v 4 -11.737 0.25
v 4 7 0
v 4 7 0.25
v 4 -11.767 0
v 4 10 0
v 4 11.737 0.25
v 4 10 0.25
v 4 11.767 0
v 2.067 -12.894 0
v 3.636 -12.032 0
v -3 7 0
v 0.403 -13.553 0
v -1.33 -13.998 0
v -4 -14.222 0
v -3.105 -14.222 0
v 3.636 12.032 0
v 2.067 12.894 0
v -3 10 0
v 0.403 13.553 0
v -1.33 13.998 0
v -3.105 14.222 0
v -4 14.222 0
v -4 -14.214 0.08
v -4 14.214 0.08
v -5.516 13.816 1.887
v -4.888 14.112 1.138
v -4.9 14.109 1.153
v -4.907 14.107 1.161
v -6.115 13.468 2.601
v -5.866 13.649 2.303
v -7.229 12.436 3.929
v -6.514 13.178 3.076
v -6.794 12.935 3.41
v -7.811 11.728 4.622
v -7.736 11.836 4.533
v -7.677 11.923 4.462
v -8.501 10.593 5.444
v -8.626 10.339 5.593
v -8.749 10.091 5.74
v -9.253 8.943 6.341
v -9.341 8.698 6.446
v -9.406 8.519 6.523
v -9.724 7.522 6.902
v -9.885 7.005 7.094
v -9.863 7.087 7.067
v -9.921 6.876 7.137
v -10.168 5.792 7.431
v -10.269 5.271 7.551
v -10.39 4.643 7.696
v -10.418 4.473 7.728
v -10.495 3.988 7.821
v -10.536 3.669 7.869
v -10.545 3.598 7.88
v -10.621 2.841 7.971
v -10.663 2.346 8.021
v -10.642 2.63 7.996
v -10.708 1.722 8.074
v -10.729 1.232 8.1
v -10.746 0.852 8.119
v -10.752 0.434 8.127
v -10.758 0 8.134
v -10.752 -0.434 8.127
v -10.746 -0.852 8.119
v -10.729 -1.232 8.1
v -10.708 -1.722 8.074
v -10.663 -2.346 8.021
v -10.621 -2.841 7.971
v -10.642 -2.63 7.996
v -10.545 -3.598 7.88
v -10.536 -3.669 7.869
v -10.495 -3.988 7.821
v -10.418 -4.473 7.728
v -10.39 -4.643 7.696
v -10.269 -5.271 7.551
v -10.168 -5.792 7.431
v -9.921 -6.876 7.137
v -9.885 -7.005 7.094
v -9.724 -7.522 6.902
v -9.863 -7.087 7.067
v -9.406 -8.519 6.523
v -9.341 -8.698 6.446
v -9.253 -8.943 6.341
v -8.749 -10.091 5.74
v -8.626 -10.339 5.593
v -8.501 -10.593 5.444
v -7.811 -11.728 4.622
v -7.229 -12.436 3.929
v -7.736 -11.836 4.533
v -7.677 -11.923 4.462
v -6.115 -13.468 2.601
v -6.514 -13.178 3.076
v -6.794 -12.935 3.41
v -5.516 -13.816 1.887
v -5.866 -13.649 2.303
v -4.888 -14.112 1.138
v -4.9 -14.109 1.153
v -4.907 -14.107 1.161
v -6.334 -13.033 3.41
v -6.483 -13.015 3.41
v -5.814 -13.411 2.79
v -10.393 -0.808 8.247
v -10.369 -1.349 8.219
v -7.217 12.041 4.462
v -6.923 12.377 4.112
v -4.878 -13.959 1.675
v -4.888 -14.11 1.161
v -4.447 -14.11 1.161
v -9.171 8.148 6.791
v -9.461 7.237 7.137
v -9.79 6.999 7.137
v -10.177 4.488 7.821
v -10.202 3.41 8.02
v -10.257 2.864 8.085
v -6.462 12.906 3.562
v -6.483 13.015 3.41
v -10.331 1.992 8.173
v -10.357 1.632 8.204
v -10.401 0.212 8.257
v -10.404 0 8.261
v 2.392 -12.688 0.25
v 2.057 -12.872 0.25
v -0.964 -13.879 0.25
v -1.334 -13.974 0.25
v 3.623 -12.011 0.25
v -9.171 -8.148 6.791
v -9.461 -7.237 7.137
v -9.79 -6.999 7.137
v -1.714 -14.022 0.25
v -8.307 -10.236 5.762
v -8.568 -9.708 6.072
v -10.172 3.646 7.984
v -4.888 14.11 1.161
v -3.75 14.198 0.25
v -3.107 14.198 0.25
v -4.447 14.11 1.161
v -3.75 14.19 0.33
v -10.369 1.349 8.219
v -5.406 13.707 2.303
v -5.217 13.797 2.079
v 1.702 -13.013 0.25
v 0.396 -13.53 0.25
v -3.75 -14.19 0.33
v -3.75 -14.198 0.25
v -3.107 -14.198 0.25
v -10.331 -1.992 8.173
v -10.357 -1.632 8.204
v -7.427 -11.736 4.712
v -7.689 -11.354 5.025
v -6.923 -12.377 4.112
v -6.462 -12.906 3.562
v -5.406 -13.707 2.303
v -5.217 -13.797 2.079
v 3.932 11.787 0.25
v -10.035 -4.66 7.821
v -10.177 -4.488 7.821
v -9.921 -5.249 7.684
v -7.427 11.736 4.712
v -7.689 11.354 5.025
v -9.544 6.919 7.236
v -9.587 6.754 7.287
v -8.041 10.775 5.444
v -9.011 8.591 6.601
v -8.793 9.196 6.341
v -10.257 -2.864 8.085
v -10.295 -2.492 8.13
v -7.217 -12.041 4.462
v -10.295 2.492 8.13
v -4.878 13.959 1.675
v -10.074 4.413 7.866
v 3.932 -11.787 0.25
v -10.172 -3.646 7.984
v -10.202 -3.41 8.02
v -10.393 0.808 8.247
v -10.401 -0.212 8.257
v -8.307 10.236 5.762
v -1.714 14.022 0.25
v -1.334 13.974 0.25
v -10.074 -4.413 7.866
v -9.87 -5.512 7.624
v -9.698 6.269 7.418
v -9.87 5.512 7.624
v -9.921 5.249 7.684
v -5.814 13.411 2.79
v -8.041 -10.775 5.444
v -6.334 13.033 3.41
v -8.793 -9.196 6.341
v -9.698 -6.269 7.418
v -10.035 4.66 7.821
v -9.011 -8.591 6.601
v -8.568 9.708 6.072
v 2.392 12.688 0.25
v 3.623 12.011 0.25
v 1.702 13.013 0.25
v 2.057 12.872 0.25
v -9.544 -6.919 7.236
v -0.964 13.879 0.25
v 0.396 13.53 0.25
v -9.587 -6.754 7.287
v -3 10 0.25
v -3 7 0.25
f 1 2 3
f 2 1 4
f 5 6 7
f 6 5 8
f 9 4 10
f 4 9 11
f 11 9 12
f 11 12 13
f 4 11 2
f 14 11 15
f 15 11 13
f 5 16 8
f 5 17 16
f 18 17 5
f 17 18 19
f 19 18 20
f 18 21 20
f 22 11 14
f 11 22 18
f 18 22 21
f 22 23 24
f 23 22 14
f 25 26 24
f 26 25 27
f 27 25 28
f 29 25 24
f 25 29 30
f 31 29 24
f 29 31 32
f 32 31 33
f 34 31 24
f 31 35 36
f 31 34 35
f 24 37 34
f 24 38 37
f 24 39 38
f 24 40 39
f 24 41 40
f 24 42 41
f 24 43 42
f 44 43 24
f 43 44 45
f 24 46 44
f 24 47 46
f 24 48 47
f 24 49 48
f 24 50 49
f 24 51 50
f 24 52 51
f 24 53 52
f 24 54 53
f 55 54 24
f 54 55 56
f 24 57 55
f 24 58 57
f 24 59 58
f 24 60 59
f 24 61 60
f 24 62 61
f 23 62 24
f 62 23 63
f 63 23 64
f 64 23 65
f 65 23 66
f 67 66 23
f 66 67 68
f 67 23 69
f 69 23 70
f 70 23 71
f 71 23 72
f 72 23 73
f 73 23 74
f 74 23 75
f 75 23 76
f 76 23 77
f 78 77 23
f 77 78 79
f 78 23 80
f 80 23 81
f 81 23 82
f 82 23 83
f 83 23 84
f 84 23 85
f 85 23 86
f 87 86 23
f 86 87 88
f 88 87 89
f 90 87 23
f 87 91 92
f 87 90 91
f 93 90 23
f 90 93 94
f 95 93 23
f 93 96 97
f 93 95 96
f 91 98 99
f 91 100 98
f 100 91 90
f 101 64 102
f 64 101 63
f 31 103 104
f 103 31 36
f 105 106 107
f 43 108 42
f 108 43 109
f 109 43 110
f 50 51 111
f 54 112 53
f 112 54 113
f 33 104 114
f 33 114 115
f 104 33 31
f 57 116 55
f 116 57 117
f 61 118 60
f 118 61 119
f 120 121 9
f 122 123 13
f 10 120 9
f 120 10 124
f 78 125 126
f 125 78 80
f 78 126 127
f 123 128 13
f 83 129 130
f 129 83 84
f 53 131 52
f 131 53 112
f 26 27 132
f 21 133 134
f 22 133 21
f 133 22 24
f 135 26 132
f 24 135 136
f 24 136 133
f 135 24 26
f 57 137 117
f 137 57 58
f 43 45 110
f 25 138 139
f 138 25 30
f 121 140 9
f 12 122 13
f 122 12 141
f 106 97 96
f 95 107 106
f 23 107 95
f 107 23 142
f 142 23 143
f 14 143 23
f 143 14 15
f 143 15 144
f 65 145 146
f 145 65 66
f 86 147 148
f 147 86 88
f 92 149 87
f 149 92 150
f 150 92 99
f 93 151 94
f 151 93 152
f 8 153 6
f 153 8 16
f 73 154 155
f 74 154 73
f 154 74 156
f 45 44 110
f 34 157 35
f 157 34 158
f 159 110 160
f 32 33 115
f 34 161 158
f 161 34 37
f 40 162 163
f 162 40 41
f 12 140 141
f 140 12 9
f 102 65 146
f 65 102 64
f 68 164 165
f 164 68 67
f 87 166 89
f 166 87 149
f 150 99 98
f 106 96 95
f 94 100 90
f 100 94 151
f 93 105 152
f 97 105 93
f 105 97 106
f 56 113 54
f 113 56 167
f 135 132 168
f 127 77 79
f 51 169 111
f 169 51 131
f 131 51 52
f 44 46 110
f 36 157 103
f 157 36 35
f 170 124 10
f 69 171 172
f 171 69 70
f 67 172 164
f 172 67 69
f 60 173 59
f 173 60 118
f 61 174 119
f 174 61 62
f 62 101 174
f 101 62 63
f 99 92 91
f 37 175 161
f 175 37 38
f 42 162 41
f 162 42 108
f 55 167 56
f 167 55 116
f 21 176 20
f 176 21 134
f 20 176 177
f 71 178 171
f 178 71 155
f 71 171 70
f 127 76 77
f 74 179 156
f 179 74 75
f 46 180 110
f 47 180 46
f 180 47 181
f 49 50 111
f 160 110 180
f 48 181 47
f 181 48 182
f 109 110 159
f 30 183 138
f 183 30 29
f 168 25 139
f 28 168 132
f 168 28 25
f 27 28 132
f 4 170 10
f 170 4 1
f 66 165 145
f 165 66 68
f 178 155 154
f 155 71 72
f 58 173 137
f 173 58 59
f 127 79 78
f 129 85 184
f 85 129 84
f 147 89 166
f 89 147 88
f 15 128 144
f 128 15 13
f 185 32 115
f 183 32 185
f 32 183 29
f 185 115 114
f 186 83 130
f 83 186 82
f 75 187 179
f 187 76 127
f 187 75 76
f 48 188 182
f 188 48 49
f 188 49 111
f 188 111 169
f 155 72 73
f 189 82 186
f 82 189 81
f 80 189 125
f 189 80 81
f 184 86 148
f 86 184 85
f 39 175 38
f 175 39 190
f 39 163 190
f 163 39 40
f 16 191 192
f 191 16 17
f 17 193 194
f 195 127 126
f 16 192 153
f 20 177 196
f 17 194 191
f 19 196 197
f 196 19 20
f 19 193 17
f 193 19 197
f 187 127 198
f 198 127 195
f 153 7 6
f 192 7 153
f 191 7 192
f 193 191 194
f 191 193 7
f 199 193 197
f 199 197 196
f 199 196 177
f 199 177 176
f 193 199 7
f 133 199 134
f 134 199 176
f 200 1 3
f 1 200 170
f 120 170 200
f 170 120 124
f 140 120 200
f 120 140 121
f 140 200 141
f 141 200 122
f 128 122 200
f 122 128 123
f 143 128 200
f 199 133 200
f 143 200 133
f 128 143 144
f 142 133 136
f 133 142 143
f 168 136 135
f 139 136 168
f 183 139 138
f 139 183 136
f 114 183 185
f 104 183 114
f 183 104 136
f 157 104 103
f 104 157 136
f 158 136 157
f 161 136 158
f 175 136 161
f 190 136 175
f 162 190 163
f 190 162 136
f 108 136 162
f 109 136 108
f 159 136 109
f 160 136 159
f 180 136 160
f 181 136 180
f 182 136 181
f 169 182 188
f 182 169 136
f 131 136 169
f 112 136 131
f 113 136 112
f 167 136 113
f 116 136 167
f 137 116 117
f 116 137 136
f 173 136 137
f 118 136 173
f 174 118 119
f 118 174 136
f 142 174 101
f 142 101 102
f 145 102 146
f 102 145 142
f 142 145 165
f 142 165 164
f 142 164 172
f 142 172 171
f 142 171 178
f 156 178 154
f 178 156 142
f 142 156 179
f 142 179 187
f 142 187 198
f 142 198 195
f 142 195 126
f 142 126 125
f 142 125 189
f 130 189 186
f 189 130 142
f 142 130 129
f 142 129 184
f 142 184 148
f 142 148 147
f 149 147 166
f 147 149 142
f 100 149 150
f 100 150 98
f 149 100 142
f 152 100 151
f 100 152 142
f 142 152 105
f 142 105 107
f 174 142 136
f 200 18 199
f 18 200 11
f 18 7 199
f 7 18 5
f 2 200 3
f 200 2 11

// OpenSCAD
$fn=50;

size=15.75;
sphere_translation=-4;

module constraint() {
    intersection(){
        union(){
            translate([0, 0, size/2])
                cube(size=[8, size*2, size], center=true);
            translate([-0.75, 0, size/2])
                rotate([0, -40, 0])
                    cube(size=[15, size*2, size], center=true);
        }
        translate([-4.5, 0, size/2])
            cube(size=[17, size*2, size], center=true);
    }
}

difference() {
	intersection(){
		constraint();
		translate([sphere_translation, 0, 0])
		scale([1,1,0.65]) 
		sphere(size-1.5);
	}
	translate([0.25,0,0.25])
	constraint();
	translate([0.5,8.5,0])
	cube([7,3,1],center=true);
}
